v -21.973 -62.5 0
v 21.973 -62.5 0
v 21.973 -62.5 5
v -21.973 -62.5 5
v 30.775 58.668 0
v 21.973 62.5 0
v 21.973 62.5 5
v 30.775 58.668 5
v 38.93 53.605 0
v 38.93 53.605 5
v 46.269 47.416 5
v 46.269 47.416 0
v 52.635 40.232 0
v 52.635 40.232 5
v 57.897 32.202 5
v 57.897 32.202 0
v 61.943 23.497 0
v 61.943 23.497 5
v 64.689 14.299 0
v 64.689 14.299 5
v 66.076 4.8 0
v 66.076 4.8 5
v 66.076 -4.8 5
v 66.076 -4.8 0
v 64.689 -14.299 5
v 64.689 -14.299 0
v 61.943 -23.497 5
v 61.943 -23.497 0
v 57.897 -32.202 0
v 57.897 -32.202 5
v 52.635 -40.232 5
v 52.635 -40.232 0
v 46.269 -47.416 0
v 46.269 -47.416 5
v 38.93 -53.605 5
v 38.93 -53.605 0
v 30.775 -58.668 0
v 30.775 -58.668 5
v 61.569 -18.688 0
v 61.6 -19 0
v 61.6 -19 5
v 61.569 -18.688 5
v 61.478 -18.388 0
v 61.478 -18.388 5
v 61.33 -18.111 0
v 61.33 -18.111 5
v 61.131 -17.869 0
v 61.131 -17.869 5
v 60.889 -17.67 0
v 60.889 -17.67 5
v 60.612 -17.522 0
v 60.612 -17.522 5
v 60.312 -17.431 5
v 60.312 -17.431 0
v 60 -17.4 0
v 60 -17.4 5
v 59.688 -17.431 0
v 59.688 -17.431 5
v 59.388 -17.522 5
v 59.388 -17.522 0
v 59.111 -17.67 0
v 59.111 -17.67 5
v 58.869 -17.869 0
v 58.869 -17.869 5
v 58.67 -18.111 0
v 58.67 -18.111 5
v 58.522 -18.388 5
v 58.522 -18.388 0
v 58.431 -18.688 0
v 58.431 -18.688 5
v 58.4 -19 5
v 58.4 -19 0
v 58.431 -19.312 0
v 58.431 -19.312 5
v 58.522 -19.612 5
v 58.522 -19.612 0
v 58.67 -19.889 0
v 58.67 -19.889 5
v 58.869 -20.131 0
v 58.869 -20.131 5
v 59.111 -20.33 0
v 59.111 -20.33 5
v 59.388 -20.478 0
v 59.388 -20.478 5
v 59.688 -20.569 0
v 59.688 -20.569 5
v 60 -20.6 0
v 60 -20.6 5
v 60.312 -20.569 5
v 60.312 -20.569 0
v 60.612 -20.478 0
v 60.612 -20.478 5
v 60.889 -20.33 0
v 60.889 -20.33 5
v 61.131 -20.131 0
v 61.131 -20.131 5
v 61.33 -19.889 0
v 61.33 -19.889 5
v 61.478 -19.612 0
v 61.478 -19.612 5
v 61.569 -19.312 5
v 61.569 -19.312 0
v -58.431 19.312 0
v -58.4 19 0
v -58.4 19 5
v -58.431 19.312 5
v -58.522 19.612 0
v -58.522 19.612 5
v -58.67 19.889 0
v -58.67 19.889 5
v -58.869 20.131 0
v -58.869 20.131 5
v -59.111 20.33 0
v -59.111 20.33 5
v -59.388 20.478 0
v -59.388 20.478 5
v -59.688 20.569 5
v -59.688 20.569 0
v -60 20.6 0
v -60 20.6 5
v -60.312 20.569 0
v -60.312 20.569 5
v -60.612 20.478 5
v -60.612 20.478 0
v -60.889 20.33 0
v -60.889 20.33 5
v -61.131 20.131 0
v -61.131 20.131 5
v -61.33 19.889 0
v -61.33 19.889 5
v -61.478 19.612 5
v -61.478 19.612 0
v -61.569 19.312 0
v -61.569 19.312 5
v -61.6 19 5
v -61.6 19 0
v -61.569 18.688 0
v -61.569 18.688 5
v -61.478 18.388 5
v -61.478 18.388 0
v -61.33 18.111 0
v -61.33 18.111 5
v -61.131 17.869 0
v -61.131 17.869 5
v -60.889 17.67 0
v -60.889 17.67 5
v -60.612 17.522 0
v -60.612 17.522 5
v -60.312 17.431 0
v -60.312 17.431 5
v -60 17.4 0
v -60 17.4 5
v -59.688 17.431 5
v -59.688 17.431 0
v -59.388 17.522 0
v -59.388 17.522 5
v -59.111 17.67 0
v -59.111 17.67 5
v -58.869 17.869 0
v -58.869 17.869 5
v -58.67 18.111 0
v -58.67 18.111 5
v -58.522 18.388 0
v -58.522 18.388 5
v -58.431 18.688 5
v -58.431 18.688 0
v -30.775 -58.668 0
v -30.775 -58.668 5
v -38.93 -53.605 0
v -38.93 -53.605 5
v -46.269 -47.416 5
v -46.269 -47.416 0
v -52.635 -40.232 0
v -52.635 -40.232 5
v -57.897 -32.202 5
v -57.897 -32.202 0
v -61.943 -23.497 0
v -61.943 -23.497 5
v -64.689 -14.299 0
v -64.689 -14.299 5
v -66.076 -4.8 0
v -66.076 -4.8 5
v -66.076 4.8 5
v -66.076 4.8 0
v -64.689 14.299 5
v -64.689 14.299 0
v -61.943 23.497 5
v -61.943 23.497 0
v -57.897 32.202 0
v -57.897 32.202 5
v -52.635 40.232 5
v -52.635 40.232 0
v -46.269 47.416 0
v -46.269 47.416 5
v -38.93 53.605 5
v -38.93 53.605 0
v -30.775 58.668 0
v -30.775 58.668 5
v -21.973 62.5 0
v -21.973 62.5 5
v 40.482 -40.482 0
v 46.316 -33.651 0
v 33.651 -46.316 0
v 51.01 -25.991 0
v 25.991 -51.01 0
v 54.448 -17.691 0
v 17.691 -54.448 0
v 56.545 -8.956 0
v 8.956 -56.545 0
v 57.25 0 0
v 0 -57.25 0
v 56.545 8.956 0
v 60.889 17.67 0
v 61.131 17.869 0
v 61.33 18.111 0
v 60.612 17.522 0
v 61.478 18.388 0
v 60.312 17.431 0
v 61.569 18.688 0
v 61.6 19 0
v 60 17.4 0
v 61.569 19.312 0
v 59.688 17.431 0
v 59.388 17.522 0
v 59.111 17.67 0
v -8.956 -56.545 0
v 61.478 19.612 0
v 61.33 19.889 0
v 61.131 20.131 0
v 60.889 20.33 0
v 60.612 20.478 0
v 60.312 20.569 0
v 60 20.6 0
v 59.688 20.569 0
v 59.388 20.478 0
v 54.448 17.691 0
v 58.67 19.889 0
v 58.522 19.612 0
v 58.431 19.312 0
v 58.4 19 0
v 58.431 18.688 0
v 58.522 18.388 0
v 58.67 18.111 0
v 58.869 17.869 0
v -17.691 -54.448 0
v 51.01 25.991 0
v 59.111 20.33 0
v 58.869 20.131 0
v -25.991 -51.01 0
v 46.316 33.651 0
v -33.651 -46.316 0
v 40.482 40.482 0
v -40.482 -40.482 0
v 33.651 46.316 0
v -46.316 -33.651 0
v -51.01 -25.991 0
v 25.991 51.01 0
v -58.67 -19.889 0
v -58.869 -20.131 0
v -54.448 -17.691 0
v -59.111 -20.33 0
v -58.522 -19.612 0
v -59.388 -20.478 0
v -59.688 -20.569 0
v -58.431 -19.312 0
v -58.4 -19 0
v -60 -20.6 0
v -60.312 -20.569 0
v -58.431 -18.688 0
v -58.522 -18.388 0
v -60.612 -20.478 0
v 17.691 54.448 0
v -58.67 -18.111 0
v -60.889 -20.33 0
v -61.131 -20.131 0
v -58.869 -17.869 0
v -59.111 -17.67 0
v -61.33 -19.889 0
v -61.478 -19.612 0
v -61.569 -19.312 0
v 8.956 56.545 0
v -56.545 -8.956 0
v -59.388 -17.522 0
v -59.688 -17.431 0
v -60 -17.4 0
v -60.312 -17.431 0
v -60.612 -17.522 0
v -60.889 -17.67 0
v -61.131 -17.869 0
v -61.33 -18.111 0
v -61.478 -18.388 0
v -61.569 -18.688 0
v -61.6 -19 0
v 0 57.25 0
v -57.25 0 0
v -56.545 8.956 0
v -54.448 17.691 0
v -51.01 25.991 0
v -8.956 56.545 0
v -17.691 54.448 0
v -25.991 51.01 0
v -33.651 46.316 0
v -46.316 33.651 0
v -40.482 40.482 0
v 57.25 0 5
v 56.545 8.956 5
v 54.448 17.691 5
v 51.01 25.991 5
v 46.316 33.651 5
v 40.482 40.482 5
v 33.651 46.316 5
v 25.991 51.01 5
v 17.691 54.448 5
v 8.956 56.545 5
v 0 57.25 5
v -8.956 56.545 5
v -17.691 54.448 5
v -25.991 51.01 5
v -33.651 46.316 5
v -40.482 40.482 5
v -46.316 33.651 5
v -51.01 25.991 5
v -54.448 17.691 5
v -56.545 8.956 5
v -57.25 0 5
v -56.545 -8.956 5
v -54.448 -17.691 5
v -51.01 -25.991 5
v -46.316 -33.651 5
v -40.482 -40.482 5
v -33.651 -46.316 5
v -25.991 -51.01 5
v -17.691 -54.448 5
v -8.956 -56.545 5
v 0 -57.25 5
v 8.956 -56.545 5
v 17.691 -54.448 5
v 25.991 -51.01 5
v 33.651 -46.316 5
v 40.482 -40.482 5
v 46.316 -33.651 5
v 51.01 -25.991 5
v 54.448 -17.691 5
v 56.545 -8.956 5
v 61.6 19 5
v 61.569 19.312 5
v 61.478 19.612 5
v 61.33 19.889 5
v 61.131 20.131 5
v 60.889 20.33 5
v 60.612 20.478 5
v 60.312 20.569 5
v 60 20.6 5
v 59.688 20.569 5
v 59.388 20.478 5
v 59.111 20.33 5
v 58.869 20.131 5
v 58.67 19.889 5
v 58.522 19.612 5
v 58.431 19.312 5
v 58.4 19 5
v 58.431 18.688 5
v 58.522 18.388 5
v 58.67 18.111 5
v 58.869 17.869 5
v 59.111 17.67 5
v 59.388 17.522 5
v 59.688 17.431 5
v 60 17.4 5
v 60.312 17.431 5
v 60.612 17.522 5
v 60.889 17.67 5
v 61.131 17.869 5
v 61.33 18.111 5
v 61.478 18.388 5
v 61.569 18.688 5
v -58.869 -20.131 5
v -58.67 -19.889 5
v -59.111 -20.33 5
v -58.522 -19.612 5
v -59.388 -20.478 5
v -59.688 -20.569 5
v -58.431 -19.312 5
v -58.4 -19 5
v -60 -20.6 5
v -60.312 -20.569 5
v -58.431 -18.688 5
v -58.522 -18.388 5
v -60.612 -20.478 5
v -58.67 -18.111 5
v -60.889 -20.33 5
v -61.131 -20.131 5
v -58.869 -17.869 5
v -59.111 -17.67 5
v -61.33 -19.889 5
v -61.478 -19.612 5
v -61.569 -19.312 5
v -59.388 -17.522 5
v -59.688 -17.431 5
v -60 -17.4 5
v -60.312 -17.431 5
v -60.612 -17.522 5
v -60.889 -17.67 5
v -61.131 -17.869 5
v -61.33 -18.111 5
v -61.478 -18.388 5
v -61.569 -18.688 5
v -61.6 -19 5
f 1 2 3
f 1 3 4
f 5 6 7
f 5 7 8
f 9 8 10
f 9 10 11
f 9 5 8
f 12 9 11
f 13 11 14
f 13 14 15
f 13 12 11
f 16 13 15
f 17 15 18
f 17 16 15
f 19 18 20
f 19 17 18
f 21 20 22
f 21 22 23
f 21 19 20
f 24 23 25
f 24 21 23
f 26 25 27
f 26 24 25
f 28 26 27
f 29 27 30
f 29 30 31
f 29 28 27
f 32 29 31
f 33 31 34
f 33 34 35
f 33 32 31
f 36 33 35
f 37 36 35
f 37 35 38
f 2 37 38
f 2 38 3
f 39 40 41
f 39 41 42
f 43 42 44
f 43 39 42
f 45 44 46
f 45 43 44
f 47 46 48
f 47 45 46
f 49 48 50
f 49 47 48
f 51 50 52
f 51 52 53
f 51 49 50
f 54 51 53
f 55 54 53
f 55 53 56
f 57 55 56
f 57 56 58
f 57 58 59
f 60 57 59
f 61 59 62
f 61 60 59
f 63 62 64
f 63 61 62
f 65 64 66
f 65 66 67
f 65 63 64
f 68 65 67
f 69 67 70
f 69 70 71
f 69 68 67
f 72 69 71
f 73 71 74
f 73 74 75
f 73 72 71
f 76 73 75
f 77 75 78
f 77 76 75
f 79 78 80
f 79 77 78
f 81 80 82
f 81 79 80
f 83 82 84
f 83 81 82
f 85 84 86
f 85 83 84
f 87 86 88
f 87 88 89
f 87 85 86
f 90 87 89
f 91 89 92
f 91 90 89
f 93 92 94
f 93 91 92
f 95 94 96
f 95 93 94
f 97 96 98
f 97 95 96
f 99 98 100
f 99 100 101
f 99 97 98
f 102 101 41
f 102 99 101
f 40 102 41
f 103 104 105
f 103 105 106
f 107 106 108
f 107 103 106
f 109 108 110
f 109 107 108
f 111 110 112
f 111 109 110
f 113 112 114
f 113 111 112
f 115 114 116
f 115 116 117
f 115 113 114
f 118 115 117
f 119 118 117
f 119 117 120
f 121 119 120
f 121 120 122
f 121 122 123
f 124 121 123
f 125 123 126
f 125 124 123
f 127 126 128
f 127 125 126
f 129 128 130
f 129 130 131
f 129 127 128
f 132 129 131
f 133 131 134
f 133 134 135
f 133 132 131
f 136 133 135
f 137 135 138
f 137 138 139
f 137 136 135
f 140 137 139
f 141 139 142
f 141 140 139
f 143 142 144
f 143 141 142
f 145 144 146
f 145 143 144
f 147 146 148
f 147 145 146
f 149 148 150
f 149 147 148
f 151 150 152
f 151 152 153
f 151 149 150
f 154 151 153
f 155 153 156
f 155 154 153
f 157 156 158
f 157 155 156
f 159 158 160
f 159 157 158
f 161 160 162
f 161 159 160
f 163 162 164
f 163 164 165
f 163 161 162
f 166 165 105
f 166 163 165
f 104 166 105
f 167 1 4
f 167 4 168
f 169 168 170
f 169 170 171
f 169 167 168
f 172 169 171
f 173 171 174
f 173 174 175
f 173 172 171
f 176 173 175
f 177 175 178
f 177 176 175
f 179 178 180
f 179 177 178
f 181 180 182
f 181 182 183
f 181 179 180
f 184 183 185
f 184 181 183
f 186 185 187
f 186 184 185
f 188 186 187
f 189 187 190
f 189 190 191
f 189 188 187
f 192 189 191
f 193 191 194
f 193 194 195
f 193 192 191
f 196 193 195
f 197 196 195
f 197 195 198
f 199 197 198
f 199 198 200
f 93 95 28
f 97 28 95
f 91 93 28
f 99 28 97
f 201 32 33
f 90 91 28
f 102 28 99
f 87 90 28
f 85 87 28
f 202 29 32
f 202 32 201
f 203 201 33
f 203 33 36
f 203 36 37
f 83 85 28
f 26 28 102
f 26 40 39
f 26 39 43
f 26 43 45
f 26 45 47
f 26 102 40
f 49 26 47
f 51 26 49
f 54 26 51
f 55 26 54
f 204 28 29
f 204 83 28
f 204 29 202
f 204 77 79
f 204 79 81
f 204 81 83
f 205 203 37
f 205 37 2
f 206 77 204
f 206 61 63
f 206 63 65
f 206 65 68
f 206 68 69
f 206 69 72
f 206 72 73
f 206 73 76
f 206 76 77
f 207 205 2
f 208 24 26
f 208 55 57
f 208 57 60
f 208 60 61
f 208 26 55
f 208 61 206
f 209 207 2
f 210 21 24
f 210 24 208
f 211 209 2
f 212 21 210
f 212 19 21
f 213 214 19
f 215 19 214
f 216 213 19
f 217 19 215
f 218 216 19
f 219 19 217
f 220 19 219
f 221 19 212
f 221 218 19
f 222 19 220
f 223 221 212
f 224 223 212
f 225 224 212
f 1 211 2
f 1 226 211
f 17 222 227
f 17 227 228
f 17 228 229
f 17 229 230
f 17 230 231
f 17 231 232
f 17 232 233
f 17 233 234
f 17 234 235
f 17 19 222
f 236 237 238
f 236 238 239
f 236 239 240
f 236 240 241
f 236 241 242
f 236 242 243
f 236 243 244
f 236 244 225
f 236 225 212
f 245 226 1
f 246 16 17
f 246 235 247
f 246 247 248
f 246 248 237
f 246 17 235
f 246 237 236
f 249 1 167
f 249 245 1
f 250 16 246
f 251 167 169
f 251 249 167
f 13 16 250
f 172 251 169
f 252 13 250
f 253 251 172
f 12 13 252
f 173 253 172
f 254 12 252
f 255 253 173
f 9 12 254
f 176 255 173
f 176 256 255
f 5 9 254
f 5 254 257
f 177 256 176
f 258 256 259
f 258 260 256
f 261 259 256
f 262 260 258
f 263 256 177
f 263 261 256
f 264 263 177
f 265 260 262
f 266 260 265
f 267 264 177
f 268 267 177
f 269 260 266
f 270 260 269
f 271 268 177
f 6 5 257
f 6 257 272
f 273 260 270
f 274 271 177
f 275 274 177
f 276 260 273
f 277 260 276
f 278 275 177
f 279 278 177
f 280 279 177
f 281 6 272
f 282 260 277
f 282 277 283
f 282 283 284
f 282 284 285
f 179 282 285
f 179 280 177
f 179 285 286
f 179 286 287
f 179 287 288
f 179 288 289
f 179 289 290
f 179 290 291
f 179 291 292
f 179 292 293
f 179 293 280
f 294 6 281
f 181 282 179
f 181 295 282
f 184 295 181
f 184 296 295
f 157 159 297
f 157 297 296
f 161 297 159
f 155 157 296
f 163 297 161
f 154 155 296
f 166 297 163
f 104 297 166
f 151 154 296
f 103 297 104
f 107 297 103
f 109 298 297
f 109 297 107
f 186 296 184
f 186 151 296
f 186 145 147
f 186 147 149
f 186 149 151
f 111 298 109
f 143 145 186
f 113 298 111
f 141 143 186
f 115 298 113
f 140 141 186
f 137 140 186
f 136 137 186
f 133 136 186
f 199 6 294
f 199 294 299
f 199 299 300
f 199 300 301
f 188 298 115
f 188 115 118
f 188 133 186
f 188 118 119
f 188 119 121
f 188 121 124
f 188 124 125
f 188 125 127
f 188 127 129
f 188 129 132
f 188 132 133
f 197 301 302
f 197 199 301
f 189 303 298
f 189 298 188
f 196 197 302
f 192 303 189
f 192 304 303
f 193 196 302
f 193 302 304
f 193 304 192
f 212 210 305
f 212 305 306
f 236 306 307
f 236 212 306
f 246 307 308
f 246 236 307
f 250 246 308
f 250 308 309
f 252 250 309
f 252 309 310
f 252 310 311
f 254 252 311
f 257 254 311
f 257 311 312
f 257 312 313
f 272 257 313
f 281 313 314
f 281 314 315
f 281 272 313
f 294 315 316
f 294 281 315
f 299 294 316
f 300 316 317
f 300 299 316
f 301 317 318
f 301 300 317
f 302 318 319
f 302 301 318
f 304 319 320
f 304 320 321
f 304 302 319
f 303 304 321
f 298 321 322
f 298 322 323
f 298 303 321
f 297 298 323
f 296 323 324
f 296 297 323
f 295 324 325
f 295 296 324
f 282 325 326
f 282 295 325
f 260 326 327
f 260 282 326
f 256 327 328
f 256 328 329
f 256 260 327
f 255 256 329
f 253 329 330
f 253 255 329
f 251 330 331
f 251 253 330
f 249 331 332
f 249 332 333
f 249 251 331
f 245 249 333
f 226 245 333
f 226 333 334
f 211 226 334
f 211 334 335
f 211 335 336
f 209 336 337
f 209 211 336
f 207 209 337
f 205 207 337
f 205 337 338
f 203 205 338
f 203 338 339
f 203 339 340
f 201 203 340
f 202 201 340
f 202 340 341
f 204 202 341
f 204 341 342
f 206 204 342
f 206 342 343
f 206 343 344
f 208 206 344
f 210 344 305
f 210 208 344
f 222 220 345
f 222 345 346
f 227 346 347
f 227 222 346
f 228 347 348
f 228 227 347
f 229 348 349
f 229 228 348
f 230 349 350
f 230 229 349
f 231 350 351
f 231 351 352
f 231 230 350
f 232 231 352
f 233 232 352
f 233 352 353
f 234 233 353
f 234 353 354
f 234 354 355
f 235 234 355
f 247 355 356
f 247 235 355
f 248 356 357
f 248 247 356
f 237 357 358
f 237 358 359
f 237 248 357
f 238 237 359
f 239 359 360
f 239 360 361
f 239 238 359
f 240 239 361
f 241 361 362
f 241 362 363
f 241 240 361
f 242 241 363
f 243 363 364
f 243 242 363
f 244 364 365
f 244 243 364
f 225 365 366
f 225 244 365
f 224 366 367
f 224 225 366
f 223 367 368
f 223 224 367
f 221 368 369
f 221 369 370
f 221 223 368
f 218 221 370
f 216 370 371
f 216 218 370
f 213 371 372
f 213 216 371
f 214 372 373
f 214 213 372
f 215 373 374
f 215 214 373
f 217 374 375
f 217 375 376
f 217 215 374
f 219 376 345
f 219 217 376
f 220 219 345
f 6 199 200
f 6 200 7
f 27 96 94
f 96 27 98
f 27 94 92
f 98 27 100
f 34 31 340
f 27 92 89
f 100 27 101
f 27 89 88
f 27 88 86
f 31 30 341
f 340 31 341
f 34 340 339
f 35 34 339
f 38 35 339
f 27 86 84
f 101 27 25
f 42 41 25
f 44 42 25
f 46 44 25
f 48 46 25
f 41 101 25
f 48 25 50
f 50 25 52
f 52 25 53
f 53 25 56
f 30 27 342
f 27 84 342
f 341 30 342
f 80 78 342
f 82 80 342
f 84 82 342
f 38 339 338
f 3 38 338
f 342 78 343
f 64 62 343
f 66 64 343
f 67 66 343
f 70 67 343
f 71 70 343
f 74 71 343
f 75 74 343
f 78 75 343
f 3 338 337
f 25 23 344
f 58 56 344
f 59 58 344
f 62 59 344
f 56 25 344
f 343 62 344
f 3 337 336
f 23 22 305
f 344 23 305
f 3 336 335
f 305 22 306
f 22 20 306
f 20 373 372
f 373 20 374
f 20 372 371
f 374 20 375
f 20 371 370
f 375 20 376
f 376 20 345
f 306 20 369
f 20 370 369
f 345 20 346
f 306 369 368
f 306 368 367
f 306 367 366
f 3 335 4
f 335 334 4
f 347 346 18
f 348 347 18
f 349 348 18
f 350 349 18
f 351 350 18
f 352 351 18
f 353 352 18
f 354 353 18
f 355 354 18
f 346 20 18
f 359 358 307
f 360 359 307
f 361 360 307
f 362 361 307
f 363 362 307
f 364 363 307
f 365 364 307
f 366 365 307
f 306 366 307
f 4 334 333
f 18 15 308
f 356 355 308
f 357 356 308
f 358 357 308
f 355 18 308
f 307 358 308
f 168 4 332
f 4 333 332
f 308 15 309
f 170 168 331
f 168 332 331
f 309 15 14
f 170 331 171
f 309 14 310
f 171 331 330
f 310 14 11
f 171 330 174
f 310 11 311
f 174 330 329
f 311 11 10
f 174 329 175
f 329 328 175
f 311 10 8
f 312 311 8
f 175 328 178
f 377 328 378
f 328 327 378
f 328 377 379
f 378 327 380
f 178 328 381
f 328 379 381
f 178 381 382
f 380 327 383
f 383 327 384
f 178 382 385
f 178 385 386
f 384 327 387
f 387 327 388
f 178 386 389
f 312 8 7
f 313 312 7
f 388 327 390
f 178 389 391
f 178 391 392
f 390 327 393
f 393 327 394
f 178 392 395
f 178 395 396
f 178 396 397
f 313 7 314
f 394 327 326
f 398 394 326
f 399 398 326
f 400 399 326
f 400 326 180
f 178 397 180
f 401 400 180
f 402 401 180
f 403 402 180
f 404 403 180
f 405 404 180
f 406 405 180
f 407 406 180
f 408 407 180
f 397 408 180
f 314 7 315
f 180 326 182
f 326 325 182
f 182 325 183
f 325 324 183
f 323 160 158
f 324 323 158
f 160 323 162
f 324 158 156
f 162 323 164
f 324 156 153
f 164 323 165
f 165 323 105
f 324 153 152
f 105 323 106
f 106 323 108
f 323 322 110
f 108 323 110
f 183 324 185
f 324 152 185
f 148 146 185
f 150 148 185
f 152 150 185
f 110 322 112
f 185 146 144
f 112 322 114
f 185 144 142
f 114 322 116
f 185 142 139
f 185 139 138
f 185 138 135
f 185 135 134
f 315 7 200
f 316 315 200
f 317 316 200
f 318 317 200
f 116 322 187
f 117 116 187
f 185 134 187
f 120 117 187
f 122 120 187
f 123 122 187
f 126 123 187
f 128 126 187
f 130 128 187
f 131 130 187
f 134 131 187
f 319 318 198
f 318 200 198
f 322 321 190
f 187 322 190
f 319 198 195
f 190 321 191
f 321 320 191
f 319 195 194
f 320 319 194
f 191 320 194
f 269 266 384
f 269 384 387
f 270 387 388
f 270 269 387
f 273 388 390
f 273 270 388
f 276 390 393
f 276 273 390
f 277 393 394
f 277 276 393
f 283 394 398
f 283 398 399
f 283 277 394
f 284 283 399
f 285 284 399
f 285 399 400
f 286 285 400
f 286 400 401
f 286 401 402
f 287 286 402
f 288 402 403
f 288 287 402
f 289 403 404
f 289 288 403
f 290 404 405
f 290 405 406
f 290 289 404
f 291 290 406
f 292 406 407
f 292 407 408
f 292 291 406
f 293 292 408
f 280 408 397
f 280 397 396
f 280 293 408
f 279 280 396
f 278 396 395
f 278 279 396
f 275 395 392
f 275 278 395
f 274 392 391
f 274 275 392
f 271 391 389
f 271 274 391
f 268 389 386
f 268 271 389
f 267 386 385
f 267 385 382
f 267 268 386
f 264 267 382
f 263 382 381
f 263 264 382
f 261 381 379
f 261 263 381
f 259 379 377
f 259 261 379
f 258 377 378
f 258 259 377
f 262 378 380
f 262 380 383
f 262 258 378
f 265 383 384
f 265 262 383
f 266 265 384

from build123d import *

# Parameters (mm, degrees)
ESQUISSE2_R        = 1.6
ESQUISSE2_R_2      = 57.25
BOSS_EXTRU_2_DEPTH = 5


with BuildPart() as part:
    # Esquisse2 → Boss.-Extru.2 (new body)
    with BuildSketch(Plane.XY):
        with BuildLine():
            Line((-21.972994789, 62.5), (21.972994789, 62.5))
            ThreePointArc((21.972994789, 62.5), (66.25, 0), (21.972994789, -62.5))
            Line((21.972994789, -62.5), (-21.972994789, -62.5))
            ThreePointArc((-21.972994789, -62.5), (-66.25, 0), (-21.972994789, 62.5))
        make_face()
        with Locations((60, 19)):
            Circle(ESQUISSE2_R, mode=Mode.SUBTRACT)
        with Locations((60, -19)):
            Circle(ESQUISSE2_R, mode=Mode.SUBTRACT)
        with Locations((-60, -19)):
            Circle(ESQUISSE2_R, mode=Mode.SUBTRACT)
        with Locations((-60, 19)):
            Circle(ESQUISSE2_R, mode=Mode.SUBTRACT)
        Circle(ESQUISSE2_R_2, mode=Mode.SUBTRACT)
    extrude(amount=BOSS_EXTRU_2_DEPTH)


solid = part.part
